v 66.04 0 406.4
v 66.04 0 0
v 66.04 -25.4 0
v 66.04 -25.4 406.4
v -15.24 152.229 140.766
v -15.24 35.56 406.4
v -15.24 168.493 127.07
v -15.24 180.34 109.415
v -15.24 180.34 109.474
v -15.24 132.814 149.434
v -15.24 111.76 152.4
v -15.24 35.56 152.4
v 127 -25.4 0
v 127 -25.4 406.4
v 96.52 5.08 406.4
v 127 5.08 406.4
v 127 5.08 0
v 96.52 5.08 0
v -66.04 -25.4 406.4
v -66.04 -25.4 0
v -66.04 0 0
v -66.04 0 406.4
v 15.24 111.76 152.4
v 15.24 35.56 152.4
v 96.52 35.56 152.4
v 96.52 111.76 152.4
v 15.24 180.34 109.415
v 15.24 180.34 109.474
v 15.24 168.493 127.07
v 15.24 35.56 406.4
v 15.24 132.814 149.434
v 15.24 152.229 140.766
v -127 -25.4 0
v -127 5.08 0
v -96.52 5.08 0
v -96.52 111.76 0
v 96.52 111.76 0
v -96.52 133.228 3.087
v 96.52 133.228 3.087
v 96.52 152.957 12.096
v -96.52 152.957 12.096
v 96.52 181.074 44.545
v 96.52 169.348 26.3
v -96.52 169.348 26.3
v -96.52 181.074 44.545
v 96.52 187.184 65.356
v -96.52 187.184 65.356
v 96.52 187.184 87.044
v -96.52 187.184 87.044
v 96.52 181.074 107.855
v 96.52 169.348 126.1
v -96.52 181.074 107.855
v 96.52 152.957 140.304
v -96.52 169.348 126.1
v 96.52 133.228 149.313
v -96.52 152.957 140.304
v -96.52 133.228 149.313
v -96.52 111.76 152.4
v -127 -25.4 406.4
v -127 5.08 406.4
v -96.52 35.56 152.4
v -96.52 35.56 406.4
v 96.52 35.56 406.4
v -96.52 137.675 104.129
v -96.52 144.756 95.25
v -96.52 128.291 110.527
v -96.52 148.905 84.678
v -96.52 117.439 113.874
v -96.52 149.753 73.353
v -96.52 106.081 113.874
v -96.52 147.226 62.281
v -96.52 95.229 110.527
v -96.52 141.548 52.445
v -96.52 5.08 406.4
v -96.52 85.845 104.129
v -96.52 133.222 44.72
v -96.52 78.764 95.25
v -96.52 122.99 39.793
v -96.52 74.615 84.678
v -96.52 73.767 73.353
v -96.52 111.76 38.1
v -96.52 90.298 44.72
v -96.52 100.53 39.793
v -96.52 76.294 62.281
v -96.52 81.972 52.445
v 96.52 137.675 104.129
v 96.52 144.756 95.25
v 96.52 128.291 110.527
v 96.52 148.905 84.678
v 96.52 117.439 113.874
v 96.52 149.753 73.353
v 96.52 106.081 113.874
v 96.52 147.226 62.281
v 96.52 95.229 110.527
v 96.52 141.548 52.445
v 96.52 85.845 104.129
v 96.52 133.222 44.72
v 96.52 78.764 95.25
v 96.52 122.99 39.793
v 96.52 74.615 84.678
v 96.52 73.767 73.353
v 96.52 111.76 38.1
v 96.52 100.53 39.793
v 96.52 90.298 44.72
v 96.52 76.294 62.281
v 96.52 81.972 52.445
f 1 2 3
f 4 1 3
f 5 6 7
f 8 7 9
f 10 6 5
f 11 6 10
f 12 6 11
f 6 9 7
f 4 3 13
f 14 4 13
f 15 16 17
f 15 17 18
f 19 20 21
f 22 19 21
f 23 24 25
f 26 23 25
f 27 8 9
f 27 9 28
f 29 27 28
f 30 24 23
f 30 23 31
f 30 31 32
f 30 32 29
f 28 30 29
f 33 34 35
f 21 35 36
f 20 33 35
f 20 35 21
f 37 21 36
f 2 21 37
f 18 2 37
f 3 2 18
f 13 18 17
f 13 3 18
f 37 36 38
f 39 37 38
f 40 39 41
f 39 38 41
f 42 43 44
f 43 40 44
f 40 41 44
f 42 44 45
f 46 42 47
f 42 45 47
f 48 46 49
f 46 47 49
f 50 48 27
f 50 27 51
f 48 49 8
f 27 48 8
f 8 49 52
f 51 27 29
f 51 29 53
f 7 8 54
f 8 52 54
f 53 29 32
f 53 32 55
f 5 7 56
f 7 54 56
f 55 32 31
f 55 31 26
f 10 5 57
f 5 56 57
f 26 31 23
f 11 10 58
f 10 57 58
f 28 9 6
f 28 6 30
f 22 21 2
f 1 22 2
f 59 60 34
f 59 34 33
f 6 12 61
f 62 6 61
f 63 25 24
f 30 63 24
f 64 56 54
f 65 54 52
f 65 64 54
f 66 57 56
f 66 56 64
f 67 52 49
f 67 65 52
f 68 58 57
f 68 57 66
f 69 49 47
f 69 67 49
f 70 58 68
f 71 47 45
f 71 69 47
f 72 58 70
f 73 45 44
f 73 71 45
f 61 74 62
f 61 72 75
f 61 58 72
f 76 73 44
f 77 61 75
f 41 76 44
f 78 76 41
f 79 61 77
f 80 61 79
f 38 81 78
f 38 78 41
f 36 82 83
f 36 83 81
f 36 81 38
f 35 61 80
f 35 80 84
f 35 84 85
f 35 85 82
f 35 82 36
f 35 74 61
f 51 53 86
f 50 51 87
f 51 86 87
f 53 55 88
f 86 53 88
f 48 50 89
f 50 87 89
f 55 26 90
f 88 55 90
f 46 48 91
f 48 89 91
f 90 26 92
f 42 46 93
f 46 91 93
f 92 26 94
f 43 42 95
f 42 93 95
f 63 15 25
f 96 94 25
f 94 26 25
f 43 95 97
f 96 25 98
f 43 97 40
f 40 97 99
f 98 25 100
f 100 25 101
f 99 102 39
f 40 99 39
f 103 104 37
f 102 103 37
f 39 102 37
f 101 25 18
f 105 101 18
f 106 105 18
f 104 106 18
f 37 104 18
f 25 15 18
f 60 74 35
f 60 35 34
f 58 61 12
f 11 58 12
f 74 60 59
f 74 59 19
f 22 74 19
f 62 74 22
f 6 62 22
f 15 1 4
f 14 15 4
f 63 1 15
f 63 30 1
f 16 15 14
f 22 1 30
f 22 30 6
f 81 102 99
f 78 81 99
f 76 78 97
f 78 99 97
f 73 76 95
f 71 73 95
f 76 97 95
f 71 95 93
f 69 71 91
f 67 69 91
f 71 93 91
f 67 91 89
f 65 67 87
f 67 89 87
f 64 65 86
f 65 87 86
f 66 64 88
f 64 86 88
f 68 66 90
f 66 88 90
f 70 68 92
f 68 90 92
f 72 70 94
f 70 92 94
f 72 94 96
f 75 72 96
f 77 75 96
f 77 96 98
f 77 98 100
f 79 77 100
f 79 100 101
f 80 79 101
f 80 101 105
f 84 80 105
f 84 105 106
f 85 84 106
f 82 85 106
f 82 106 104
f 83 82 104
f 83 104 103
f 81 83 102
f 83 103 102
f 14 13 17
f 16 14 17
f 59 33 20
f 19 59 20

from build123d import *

# Parameters (mm, degrees)
BOSS_EXTRUDE1_DEPTH = 406.4
SKETCH3_W           = 193.04
SKETCH3_H           = 152.4
BOSS_EXTRUDE2_DEPTH = 152.4
SKETCH4_W           = 30.48
SKETCH4_H           = 254
BOSS_EXTRUDE3_DEPTH = 144.78
SKETCH5_R           = 38.1
CUT_EXTRUDE1_DEPTH  = 193.04
FILLET1_R           = 76.2
CHAMFER2_SIZE       = 144.78
CHAMFER2_SIZE2      = 296.926


with BuildPart() as part:
    # Sketch2 → Boss-Extrude1 (new body)
    with BuildSketch(Plane.XY):
        Polygon((-96.52, 5.08), (-127, 5.08), (-127, -25.4), (-66.04, -25.4), (-66.04, 0), (66.04, 0), (66.04, -25.4), (127, -25.4), (127, 5.08), (96.52, 5.08), (96.52, 35.56), (-96.52, 35.56), align=None)
    extrude(amount=BOSS_EXTRUDE1_DEPTH)

    # Sketch3 → Boss-Extrude2 (add)
    with BuildSketch(Plane(origin=(0, 35.56, 0), x_dir=(1, 0, 0), z_dir=(0, 1, 0))):
        with Locations((0, -76.2)):
            Rectangle(SKETCH3_W, SKETCH3_H)
    extrude(amount=BOSS_EXTRUDE2_DEPTH)

    # Sketch4 → Boss-Extrude3 (add)
    with BuildSketch(Plane(origin=(0, 35.56, 0), x_dir=(1, 0, 0), z_dir=(0, 1, 0))):
        with Locations((0, -279.4)):
            Rectangle(SKETCH4_W, SKETCH4_H)
    extrude(amount=BOSS_EXTRUDE3_DEPTH)

    # Sketch5 → Cut-Extrude1 (cut)
    with BuildSketch(Plane(origin=(96.52, 0, 0), x_dir=(0, 0, -1), z_dir=(1, 0, 0))):
        with Locations((-76.2, 111.76)):
            Circle(SKETCH5_R)
    extrude(amount=-CUT_EXTRUDE1_DEPTH, mode=Mode.SUBTRACT)

    # Fillet1
    # the kernel refuses this fillet: 76.2 mm, written as the material it takes off along each edge
    with BuildSketch(Plane(origin=(287.02, 187.96, 152.4), x_dir=(0, -1, 0), z_dir=(-1, 0, 0))) as fillet1_piece_1_section:
        with BuildLine():
            CenterArc((FILLET1_R, -FILLET1_R), FILLET1_R, 90, 90)
            Line((0, -FILLET1_R), (0, 0))
            Line((0, 0), (FILLET1_R, 0))
        make_face()
    fillet1_piece_1 = extrude(amount=574.04, mode=Mode.PRIVATE)
    fillet1_piece_1 = split(fillet1_piece_1, bisect_by=Plane(origin=(15.24, 162.276069746, 141.915616322), z_dir=(1, 0, 0)), keep=Keep.TOP, mode=Mode.PRIVATE)
    fillet1_piece_1 = split(fillet1_piece_1, bisect_by=Plane(origin=(151.13, 180.34, 141.915616322), z_dir=(0, -1, 0)), keep=Keep.TOP, mode=Mode.PRIVATE)
    add(fillet1_piece_1, mode=Mode.SUBTRACT)
    with BuildSketch(Plane(origin=(287.02, 187.96, 152.4), x_dir=(0, -1, 0), z_dir=(-1, 0, 0))) as fillet1_piece_2_section:
        with BuildLine():
            CenterArc((FILLET1_R, -FILLET1_R), FILLET1_R, 90, 90)
            Line((0, -FILLET1_R), (0, 0))
            Line((0, 0), (FILLET1_R, 0))
        make_face()
    fillet1_piece_2 = extrude(amount=574.04, mode=Mode.PRIVATE)
    fillet1_piece_2 = split(fillet1_piece_2, bisect_by=Plane(origin=(15.24, 185.388736326, 123.368401859), z_dir=(1, 0, 0)), keep=Keep.TOP, mode=Mode.PRIVATE)
    fillet1_piece_2 = split(fillet1_piece_2, bisect_by=Plane(origin=(151.13, 180.34, 123.368401859), z_dir=(0, 1, 0)), keep=Keep.TOP, mode=Mode.PRIVATE)
    add(fillet1_piece_2, mode=Mode.SUBTRACT)
    with BuildSketch(Plane(origin=(287.02, 187.96, 152.4), x_dir=(0, -1, 0), z_dir=(-1, 0, 0))) as fillet1_piece_3_section:
        with BuildLine():
            CenterArc((FILLET1_R, -FILLET1_R), FILLET1_R, 90, 90)
            Line((0, -FILLET1_R), (0, 0))
            Line((0, 0), (FILLET1_R, 0))
        make_face()
    fillet1_piece_3 = extrude(amount=574.04, mode=Mode.PRIVATE)
    fillet1_piece_3 = split(fillet1_piece_3, bisect_by=Plane(origin=(15.24, 185.388736326, 123.368401859), z_dir=(-1, 0, 0)), keep=Keep.TOP, mode=Mode.PRIVATE)
    fillet1_piece_3 = split(fillet1_piece_3, bisect_by=Plane(origin=(0, 180.34, 123.368401859), z_dir=(0, 1, 0)), keep=Keep.TOP, mode=Mode.PRIVATE)
    fillet1_piece_3 = split(fillet1_piece_3, bisect_by=Plane(origin=(-15.24, 185.388736326, 123.368401859), z_dir=(1, 0, 0)), keep=Keep.TOP, mode=Mode.PRIVATE)
    add(fillet1_piece_3, mode=Mode.SUBTRACT)
    with BuildSketch(Plane(origin=(287.02, 187.96, 152.4), x_dir=(0, -1, 0), z_dir=(-1, 0, 0))) as fillet1_piece_4_section:
        with BuildLine():
            CenterArc((FILLET1_R, -FILLET1_R), FILLET1_R, 90, 90)
            Line((0, -FILLET1_R), (0, 0))
            Line((0, 0), (FILLET1_R, 0))
        make_face()
    fillet1_piece_4 = extrude(amount=574.04, mode=Mode.PRIVATE)
    fillet1_piece_4 = split(fillet1_piece_4, bisect_by=Plane(origin=(-151.13, 180.34, 141.915616322), z_dir=(0, -1, 0)), keep=Keep.TOP, mode=Mode.PRIVATE)
    fillet1_piece_4 = split(fillet1_piece_4, bisect_by=Plane(origin=(-15.24, 162.276069746, 141.915616322), z_dir=(-1, 0, 0)), keep=Keep.TOP, mode=Mode.PRIVATE)
    add(fillet1_piece_4, mode=Mode.SUBTRACT)
    with BuildSketch(Plane(origin=(287.02, 187.96, 152.4), x_dir=(0, -1, 0), z_dir=(-1, 0, 0))) as fillet1_piece_5_section:
        with BuildLine():
            CenterArc((FILLET1_R, -FILLET1_R), FILLET1_R, 90, 90)
            Line((0, -FILLET1_R), (0, 0))
            Line((0, 0), (FILLET1_R, 0))
        make_face()
    fillet1_piece_5 = extrude(amount=574.04, mode=Mode.PRIVATE)
    fillet1_piece_5 = split(fillet1_piece_5, bisect_by=Plane(origin=(-151.13, 180.34, 123.368401859), z_dir=(0, 1, 0)), keep=Keep.TOP, mode=Mode.PRIVATE)
    fillet1_piece_5 = split(fillet1_piece_5, bisect_by=Plane(origin=(-15.24, 185.388736326, 123.368401859), z_dir=(-1, 0, 0)), keep=Keep.TOP, mode=Mode.PRIVATE)
    add(fillet1_piece_5, mode=Mode.SUBTRACT)
    with BuildSketch(Plane(origin=(-287.02, 187.96, 0), x_dir=(0, -1, 0), z_dir=(1, 0, 0))) as fillet1_piece_6:
        with BuildLine():
            CenterArc((FILLET1_R, -FILLET1_R), FILLET1_R, 90, 90)
            Line((0, -FILLET1_R), (0, 0))
            Line((0, 0), (FILLET1_R, 0))
        make_face()
    extrude(amount=574.04, mode=Mode.SUBTRACT)

    # Chamfer2
    chamfer2_edges = [part.edges().sort_by_distance(p)[0] for p in [
        (0, 180.34, 406.4),
    ]]
    chamfer2_side = [part.faces().sort_by_distance(p)[0] for p in [
        (0, 38.129015817, 406.4),
    ]]
    chamfer(chamfer2_edges, length=CHAMFER2_SIZE, length2=CHAMFER2_SIZE2, reference=chamfer2_side[0])


solid = part.part
